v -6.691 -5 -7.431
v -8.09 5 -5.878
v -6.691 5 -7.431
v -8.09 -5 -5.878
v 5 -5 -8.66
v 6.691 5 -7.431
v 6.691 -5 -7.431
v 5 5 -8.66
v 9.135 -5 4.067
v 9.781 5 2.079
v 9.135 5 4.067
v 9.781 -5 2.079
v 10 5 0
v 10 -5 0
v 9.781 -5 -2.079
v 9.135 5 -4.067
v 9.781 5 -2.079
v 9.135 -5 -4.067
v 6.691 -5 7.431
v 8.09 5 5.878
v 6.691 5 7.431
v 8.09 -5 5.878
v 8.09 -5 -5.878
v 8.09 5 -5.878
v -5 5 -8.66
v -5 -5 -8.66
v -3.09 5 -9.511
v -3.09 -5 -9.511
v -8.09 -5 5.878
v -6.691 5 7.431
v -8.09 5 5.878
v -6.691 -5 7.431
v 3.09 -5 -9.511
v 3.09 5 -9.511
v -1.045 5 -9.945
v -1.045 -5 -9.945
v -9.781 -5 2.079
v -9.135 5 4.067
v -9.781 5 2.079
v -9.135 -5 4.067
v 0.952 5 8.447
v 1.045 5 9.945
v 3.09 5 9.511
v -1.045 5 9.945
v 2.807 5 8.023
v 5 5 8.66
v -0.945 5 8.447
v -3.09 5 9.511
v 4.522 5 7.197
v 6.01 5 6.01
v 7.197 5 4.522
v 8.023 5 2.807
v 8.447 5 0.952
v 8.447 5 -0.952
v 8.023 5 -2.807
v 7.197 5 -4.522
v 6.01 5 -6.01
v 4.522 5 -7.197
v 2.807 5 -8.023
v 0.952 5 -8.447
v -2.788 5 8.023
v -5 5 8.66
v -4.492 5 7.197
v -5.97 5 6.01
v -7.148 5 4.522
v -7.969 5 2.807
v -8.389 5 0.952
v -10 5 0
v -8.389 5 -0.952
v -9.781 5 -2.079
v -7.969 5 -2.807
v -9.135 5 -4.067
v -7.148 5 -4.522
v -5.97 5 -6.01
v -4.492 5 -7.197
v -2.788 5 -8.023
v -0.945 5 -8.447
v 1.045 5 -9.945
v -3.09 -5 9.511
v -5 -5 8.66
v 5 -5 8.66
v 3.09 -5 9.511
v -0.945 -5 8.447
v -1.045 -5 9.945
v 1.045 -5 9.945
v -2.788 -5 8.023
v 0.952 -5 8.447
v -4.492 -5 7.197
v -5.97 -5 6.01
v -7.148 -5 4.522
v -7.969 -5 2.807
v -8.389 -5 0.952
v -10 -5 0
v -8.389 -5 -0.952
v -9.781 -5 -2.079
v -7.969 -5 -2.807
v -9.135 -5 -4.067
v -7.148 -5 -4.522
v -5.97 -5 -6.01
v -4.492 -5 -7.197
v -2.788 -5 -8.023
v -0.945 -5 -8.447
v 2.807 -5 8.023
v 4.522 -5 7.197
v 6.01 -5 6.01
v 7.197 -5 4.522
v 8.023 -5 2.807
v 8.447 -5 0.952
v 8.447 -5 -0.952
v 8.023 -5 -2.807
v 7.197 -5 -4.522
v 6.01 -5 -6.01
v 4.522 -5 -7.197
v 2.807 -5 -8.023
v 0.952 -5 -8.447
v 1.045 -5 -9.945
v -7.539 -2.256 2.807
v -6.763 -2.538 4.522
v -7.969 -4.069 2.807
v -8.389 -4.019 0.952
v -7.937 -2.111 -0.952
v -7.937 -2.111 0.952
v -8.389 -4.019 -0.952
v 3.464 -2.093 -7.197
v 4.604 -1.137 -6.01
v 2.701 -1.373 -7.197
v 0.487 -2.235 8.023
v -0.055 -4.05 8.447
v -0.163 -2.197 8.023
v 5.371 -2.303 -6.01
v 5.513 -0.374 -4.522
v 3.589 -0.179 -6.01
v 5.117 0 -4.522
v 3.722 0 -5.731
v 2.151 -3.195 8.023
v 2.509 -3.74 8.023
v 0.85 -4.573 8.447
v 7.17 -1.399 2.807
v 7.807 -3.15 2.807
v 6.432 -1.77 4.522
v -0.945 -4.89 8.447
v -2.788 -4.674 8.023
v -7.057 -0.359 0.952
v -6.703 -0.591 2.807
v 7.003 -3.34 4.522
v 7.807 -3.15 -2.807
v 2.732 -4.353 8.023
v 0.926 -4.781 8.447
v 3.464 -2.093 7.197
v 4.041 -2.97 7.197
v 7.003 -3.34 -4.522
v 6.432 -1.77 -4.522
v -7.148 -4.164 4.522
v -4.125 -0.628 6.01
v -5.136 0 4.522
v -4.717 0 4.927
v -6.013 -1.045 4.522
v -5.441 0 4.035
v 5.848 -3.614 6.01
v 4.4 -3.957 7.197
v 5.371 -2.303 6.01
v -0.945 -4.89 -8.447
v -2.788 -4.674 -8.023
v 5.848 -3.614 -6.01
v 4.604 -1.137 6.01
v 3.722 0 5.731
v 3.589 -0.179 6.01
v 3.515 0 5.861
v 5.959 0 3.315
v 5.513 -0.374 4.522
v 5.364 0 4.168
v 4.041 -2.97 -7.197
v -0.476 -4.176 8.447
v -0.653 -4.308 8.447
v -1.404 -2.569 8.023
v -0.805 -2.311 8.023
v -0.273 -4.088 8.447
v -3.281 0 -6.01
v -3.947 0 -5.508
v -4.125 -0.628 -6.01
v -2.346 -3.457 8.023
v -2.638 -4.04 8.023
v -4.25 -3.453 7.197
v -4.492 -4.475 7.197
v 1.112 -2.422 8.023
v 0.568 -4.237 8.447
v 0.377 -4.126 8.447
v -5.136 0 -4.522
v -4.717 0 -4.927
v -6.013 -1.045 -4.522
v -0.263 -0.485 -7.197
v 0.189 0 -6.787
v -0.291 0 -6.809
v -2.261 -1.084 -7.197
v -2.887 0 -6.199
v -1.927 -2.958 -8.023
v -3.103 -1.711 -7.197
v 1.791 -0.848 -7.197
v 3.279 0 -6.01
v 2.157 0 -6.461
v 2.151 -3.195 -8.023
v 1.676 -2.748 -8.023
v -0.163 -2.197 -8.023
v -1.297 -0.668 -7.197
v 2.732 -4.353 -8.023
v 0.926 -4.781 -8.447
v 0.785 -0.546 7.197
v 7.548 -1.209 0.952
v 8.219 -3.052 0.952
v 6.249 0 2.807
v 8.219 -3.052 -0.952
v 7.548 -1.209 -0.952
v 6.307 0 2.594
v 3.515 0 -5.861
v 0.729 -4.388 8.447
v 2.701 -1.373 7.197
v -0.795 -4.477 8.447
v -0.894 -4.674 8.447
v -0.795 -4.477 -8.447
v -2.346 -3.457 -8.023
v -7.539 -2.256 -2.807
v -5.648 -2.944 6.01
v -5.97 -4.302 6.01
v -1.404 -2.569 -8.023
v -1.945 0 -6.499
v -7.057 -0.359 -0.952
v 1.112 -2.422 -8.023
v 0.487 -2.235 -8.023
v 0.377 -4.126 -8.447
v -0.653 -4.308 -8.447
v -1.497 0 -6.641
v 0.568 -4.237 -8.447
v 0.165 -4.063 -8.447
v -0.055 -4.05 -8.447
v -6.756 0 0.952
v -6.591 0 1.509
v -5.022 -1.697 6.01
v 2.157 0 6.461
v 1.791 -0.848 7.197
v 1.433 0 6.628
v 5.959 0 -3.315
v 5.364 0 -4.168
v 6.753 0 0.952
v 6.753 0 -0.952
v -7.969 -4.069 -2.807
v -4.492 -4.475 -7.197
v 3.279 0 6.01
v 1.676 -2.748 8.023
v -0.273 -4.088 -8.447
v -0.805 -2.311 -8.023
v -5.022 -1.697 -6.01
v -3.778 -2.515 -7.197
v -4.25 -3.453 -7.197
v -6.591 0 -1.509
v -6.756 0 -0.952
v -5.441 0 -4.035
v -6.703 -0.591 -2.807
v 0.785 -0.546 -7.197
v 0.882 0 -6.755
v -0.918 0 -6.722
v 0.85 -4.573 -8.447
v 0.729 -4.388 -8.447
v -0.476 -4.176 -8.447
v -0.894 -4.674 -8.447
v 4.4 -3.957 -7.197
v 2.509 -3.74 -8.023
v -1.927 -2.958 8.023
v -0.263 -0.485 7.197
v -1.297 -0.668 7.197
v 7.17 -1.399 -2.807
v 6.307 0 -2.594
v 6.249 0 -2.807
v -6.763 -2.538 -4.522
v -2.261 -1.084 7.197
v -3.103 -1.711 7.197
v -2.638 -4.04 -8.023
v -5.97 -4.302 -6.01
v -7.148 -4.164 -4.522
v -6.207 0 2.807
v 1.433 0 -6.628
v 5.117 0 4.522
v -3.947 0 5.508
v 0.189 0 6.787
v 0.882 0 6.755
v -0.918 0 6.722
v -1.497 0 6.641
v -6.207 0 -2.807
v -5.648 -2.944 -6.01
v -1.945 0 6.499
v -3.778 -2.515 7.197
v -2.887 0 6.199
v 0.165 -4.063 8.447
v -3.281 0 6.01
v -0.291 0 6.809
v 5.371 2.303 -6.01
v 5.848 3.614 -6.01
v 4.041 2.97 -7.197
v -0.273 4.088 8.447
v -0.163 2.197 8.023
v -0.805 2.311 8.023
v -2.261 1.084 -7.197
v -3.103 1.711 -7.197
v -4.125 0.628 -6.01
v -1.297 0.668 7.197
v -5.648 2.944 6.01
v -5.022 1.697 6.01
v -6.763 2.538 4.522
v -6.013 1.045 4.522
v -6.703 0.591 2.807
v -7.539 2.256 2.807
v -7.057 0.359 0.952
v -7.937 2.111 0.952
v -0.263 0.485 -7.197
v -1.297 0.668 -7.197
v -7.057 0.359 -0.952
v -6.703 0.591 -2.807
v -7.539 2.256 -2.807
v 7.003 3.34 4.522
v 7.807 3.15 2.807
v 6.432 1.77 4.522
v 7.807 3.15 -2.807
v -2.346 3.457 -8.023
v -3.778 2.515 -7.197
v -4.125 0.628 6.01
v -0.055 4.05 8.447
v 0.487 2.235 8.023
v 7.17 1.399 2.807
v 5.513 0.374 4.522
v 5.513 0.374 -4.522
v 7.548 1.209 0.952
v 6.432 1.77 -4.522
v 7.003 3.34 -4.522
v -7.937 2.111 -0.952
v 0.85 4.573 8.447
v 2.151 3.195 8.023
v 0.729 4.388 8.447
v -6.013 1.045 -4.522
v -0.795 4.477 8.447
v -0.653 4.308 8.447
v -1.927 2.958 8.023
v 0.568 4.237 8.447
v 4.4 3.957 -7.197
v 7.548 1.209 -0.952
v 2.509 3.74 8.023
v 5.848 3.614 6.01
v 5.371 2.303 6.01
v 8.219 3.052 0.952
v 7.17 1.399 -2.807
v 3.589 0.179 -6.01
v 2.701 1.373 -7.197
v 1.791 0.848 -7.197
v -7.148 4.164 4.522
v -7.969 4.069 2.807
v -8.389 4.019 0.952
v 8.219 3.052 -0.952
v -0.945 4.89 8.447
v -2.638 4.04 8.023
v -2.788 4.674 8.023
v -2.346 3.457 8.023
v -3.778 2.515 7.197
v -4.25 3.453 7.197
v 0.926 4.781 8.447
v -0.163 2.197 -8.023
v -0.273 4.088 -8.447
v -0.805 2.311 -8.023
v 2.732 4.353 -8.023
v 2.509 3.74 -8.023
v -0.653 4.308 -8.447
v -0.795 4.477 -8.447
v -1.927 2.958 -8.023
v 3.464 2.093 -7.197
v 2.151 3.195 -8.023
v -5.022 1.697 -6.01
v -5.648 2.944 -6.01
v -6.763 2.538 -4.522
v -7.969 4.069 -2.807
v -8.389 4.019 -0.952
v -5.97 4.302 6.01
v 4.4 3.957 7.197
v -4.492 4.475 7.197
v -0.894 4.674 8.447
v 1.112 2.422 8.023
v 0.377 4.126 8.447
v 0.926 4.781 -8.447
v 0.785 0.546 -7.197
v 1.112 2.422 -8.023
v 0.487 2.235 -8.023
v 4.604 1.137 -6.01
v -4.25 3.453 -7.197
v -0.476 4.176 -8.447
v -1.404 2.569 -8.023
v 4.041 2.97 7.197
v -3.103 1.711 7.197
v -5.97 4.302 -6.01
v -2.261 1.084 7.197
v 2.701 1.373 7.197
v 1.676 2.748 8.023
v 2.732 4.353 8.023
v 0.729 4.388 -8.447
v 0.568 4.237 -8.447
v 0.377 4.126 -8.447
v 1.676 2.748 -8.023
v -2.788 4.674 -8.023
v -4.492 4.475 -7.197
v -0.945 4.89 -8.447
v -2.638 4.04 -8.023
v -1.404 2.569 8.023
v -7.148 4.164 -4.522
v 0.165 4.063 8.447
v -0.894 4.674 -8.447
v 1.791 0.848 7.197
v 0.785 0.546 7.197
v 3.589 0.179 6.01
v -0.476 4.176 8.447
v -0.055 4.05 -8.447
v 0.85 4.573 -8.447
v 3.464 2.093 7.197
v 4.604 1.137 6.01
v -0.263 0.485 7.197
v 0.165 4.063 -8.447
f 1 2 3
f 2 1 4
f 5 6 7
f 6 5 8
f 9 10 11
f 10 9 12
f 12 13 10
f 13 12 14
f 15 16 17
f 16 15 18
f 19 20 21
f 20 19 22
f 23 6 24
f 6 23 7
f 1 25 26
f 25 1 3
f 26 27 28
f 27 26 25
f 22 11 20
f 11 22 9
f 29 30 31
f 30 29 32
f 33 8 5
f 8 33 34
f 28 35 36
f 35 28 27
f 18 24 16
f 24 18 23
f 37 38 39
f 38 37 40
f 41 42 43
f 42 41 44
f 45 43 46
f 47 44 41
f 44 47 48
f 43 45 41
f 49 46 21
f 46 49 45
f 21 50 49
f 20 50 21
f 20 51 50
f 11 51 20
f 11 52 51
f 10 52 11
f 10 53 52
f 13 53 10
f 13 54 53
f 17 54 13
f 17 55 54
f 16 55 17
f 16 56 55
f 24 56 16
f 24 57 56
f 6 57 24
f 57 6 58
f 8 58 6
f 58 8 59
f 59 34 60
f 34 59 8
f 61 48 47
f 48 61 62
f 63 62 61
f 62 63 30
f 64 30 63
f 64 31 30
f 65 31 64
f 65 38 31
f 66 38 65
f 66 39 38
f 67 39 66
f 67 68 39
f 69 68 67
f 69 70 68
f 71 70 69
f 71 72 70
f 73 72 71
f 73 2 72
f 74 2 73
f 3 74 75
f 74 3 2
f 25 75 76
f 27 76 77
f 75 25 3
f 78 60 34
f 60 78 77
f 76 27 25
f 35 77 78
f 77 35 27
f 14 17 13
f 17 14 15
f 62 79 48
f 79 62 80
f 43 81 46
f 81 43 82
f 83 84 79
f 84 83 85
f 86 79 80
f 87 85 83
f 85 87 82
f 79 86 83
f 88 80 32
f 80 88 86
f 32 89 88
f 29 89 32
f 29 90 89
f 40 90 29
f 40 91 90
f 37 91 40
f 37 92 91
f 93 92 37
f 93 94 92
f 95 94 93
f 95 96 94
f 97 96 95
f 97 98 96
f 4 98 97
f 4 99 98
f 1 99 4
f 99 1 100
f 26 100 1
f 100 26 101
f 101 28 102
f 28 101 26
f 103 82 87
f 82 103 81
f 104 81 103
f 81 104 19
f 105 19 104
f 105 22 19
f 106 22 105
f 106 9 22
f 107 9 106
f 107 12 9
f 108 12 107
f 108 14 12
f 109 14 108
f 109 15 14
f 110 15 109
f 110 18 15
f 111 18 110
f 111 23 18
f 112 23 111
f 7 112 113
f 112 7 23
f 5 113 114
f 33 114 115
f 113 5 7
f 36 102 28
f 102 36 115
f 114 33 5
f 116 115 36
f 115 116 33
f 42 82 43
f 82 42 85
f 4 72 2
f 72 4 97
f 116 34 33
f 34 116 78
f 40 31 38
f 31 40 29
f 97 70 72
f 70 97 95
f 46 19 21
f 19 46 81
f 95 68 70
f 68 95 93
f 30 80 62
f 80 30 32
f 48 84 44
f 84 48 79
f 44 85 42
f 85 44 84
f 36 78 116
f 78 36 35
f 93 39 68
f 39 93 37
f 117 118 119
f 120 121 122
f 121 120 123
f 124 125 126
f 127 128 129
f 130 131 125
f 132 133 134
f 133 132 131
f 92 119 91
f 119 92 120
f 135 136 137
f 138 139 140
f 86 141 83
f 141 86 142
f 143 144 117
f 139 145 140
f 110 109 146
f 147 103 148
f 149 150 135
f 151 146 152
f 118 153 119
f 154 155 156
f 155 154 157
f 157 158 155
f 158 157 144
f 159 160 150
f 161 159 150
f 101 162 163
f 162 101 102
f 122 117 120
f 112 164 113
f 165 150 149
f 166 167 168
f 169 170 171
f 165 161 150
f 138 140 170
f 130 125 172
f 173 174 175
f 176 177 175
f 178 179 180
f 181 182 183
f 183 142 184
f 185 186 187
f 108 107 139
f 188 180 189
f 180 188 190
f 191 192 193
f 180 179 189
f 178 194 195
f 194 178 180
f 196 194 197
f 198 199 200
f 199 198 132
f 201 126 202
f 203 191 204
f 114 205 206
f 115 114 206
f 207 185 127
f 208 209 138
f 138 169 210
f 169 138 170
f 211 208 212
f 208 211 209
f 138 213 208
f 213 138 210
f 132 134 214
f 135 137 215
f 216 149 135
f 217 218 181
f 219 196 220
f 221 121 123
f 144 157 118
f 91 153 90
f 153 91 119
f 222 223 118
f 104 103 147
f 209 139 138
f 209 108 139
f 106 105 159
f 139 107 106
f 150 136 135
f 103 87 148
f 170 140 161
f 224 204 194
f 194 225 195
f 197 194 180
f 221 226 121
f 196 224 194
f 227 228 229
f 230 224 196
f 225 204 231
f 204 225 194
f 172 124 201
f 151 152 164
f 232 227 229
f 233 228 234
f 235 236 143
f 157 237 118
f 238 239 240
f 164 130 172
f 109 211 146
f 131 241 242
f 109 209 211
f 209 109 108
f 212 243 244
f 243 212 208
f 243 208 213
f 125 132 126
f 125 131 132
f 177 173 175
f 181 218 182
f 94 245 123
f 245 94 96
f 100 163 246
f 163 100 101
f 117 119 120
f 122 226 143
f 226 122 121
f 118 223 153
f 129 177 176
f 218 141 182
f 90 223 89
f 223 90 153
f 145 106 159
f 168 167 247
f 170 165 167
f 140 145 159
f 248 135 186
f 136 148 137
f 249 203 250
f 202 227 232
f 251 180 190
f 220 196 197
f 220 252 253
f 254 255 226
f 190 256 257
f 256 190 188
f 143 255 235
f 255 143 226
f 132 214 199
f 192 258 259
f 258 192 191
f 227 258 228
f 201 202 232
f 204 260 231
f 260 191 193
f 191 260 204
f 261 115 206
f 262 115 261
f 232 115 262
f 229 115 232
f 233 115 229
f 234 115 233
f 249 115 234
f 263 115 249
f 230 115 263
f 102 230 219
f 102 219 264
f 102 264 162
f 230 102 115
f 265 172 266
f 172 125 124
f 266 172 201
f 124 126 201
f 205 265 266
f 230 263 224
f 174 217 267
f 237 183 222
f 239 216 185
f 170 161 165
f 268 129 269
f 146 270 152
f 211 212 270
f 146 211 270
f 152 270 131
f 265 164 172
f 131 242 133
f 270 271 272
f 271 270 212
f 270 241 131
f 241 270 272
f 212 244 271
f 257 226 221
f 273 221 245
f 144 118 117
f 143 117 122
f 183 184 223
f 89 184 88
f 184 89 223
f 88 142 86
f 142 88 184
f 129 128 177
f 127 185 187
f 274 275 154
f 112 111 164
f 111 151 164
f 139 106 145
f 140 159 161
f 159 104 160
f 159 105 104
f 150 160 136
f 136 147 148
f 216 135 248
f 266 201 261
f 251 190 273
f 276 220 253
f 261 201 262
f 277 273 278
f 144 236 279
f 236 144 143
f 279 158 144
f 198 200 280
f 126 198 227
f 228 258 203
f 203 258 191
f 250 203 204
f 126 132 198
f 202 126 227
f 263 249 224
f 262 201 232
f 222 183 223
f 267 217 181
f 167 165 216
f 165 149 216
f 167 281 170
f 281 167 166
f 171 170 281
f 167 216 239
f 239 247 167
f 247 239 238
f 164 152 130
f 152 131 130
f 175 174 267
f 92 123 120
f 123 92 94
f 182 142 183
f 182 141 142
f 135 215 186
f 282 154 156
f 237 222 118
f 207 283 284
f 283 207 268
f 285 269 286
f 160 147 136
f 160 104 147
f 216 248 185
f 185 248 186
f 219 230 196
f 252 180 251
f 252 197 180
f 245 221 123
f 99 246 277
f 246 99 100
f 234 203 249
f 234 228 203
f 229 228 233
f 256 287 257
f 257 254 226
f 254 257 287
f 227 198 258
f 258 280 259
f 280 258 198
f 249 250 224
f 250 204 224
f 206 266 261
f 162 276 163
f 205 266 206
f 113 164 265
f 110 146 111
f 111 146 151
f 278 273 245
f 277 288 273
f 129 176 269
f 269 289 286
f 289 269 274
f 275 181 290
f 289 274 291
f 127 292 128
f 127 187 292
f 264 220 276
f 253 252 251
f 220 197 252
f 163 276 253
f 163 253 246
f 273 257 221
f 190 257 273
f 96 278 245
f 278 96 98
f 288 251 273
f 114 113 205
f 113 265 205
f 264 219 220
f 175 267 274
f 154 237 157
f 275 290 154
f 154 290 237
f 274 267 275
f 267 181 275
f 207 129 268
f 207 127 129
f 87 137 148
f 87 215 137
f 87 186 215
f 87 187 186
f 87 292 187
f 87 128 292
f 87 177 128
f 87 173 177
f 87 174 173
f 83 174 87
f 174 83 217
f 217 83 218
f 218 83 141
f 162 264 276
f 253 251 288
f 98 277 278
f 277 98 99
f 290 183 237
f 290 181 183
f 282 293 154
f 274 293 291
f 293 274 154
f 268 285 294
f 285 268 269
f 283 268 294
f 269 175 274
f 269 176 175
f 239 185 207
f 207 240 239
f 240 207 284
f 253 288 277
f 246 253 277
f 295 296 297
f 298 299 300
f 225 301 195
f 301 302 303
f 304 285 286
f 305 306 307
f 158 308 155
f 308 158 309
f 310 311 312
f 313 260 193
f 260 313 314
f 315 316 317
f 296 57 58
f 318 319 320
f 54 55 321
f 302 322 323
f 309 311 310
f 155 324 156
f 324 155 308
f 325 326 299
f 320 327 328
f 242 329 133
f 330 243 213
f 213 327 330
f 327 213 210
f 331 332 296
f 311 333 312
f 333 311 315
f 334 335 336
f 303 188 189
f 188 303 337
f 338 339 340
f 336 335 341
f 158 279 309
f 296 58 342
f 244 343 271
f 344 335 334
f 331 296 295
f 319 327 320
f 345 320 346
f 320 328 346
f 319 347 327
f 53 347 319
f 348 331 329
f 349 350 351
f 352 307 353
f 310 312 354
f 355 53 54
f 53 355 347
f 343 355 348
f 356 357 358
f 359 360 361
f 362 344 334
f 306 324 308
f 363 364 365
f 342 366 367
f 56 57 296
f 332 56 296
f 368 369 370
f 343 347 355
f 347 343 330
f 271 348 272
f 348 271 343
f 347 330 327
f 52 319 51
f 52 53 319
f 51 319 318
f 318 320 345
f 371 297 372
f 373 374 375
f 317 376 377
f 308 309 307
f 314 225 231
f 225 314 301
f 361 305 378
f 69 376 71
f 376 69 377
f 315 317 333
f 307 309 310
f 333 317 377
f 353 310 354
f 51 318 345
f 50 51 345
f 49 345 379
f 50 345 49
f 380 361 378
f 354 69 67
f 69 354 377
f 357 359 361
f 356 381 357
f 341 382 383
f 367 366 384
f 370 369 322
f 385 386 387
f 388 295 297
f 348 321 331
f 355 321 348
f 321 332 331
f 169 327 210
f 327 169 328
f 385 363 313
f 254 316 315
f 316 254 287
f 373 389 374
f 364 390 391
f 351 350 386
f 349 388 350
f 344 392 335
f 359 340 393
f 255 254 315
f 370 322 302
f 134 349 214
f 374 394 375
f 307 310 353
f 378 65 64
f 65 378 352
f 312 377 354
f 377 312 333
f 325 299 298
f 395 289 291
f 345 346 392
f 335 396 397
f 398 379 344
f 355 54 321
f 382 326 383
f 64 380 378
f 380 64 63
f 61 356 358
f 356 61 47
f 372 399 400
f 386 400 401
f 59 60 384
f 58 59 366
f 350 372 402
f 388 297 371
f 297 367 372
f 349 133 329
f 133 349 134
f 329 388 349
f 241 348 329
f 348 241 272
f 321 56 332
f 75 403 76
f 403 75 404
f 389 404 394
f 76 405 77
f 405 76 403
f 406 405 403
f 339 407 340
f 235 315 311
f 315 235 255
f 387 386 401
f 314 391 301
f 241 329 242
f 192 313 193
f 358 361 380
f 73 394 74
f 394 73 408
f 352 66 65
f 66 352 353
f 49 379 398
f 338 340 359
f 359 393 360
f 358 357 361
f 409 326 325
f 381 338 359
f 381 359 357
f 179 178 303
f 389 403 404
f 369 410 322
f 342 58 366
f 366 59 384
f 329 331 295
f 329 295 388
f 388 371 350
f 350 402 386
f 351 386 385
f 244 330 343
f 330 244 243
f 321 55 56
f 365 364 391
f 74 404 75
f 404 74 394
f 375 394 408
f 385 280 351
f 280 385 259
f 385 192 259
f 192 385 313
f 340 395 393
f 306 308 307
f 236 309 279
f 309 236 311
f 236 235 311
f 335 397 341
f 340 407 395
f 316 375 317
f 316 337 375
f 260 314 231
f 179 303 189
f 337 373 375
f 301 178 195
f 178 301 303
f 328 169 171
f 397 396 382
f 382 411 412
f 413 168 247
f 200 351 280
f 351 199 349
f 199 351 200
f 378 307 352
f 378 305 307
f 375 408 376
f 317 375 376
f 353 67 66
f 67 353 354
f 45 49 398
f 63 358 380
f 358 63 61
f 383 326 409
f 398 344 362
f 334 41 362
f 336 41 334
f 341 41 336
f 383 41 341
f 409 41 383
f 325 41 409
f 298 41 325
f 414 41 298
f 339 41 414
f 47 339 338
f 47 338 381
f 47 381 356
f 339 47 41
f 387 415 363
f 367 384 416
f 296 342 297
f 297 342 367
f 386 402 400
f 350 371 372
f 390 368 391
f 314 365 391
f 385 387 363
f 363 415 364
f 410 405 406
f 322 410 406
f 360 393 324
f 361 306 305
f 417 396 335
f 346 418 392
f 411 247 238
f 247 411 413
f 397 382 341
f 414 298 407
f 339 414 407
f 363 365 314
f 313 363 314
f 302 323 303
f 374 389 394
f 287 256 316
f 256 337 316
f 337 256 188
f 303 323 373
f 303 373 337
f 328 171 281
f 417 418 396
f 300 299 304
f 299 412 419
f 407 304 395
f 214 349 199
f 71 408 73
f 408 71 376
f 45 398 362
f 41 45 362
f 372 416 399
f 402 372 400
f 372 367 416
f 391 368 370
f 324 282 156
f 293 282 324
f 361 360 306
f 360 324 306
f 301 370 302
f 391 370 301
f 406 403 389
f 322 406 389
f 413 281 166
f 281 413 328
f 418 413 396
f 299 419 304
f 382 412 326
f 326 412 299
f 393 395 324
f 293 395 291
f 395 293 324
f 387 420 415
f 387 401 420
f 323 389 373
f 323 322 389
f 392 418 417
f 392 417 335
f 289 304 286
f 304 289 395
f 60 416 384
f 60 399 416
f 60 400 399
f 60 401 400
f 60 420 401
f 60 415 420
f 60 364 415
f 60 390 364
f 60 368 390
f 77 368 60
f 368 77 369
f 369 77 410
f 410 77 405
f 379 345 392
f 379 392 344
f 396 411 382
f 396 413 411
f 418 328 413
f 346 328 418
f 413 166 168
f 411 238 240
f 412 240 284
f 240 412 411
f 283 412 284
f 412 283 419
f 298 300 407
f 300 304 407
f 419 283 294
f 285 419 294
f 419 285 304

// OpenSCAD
intersection() {    
    difference() {
        rotate([90, 0, 0]) {
            translate([0, 0, -5]) {
                cylinder(10, 10, 10);
            }
        }
        translate([0, -5, 0])
            sphere(r=8.5);
        translate([0, 5, 0])
            sphere(r=8.5);
    }
    //sphere(r=10.0);
}
